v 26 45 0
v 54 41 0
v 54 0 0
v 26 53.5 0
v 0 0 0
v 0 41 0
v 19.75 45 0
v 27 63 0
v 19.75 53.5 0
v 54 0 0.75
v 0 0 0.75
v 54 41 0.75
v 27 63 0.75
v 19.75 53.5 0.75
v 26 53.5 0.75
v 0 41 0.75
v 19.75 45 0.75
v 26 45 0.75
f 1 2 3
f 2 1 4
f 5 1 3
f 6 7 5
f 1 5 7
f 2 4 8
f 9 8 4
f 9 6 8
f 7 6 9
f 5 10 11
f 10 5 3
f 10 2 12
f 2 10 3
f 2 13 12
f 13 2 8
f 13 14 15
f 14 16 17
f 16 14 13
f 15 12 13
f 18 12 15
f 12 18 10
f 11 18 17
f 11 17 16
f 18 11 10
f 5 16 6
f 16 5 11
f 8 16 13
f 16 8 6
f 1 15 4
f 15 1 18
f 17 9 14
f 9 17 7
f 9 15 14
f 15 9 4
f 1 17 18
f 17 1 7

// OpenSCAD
/*
    Projekt Name: Trennwaende fuer das Modellhaus 3723
    Modul:  Wand Suedseite
    Projekt URL: https://github.com/Hardi-St/MobaLedLib_Docu/tree/master/3D_Daten_fuer_die_MobaLedLib/Trennwände%20für%20Häuser
    Version: 0.0.1
    Autor: Moba-Nick (mobanick@wp12085804.server-he.de)
    Lizenz: CC-BY-SA-4.0 (https://creativecommons.org/licenses/by-sa/4.0/legalcode.de)
*/
//  Alle Angaben sind immer in mm bei meinen Projekten.
//  Parameter fuer die Wand
x_all = 54;  //Breite der Wand = Breite der Grundplatte
z_all = 0.75; //Wandstaerke gibnt an, wie Dick die Wand ist. 0.75 ist dick genug um kein Licht durchzulassen, aber duenn genug um Material zu sparen.
y_erdgeschoss = 41;     //Hoehe Erdgeschoss 
y_dachschraege = 22;    // Hoehe Dachgeschoss
y_all = y_erdgeschoss + y_dachschraege;

/*  Der Parameter "$fn" sagt, wie rund die Ausschnitte von Kreisen sind. Je hoeher die Zahl desto mehr Kreispunkte werden verwendet. Minimum ist 3, Maximum ist 999 (Ich nehme nie mehr als 150 sonst wird die Berechnungszeit zu gross). Als ideal haben sich Werte zwischen 35 und 45 ergeben. 
    Bei 3 wird es ein Dreieck, bei 4 eine Raute.
*/
$fn=40;
/* 
    Hier erfolgt die eigentliche Arbeit. Als erstes wird die komplette Wand erstellt mit Hilfe des Modules "HauptWand()". 
    Danach werden alle weiteren Elemente die in der Funktion "difference()" erstellt aus dieser Wand ausgeschnitten. Dadurch ergeben sich die Oeffnungen fuer die Fenster und Tueren, damit da Licht durchscheinen kann. 
    Weitere Informatioen zur Funktion "difference()" gibt es hier https://en.wikibooks.org/wiki/OpenSCAD_User_Manual/CSG_Modelling#difference
*/
difference(){
    HauptWand();
    Fenster(-7.25,45.00,6.25,8.5);
}




/* 
!!!!!!!!!!!!!!!!!!!!!!!!!!!!!!!!!!!!!!!!!!!!!!!!!!!!!!!!!!!!!!!!!!!    
!!!!    Ab hier kommen die Module. Bitte nur aendern wann man   !!!!
!!!!    weiss was man macht.                                    !!!!
!!!!!!!!!!!!!!!!!!!!!!!!!!!!!!!!!!!!!!!!!!!!!!!!!!!!!!!!!!!!!!!!!!!
/*  
    Das Module HauptWand erstellt die Wand des Hauses inkl. der Dachschraege aus einen Polyhydron. Dazu wurde im Bereich fuer die Parameter in den  Zeilen 10 - 14 die Werte fuer die Breite der Wand (x_all) sowie die Höhe des Erdgeschosses (y_erdgeschoss) und des oberen Stockwerks (y_dachschraege) angeben.
*/
module HauptWand(){   
    //  PolyPunkte gibt an wo sicher welcher Punkt befindet. 
    //  Die Korrdinaten werden immer im Format [x,y,z] uebergeben.
    PolyPunkte = [
    [0,0,0],    // 0
    [0,y_erdgeschoss,0],    // 1
    [x_all/2,y_all,0],    // 2
    [x_all,y_erdgeschoss,0],    // 3
    [x_all,0,0],    // 4
    [0,0,z_all],    // 5
    [x_all,0,z_all],    // 6
    [x_all,y_erdgeschoss,z_all],    // 7
    [x_all/2,y_all,z_all],    // 8
    [0,y_erdgeschoss,z_all]];    // 9
    
    //  PolyFlaechen gibt an welche Punkte welche Flaechen beschreiben. 
    //  Die Korrdinaten werden immer im Format [x,y,z] uebergeben.
    PolyFlaechen =[
    [0,1,2,3,4],    // Unten (Boden)
    [5,0,4,6],      // Vorne (vordere Kante)
    [6,4,3,7],      // Rechts unten (Erdgeschoss)
    [7,3,2,8],      // Rechts oben  (Dachgeschoss/Dachschraege)
    [6,7,8,9,5],    // Oben (Deckel)
    [9,1,0,5],      // Links unten  (Erdgeschoss)
    [8,2,1,9]];     // Links oben   (Dachgeschoss/Dachschraege)
      
    polyhedron( PolyPunkte, PolyFlaechen );
}

/*  
    Das Module Fenster erstellt wie der Name schon sagt, die Ausschnitte fuer die Fenster.
    Dabei gibt es 4 Variablen die uebergeben werden.
    "pos_x" gibt die Startposition des linken unteren Ecke im Bezug zur Mittelachse des Hauses an.
    "pos_y" gibt die Startposition der inken untren Ecke im Bezug zur Grundplatte an.
    "size_x" gibt die Breite des Fensters an
    "size_y" gibt die Hoehe des Fensters an
    Beispiel: Der Befehl "Fenster(10,20,15,10);" erzeugt ein Fenster 10mm von der Mitte nach Rechts, auf der Hoehe von 20mm mit einer Breite von 15mm und einer Hoehe von 10mm;
*/
module Fenster(pos_x, pos_y, size_x, size_y){
    translate([x_all/2+pos_x, pos_y, 0]){
        cube([size_x,size_y,z_all*1.25],false);
    }
}

/*  
    Das Module Fenster_rund erstellt wie der Name schon sagt, die Ausschnitte fuer die Fenster mit rundem Ausschnitt.
    Dabei gibt es 3 Variablen die uebergeben werden.
    "pos_x" gibt die Startposition der linken unteren Ecke im Bezug zur Mittelachse des Hauses an.
    "pos_y" gibt die Startposition der inken unteren Ecke im Bezug zur Grundplatte an.
    "size_x" gibt die Breite des Fensters an
    Beispiel: Der Befehl "Fenster_rund(10,20,5);" erzeugt ein Fenster 10mm von der Mitte nach Rechts, auf der Hoehe von 20mm mit einem Durchmesser von 5mm;
*/
module Fenster_Rund(pos_x, pos_y, size_x){
    
    translate([x_all/2+pos_x+size_x/2, pos_y+size_x/2, 0]){
        cylinder(h=z_all*1.25,d=size_x,false);
    }
}
